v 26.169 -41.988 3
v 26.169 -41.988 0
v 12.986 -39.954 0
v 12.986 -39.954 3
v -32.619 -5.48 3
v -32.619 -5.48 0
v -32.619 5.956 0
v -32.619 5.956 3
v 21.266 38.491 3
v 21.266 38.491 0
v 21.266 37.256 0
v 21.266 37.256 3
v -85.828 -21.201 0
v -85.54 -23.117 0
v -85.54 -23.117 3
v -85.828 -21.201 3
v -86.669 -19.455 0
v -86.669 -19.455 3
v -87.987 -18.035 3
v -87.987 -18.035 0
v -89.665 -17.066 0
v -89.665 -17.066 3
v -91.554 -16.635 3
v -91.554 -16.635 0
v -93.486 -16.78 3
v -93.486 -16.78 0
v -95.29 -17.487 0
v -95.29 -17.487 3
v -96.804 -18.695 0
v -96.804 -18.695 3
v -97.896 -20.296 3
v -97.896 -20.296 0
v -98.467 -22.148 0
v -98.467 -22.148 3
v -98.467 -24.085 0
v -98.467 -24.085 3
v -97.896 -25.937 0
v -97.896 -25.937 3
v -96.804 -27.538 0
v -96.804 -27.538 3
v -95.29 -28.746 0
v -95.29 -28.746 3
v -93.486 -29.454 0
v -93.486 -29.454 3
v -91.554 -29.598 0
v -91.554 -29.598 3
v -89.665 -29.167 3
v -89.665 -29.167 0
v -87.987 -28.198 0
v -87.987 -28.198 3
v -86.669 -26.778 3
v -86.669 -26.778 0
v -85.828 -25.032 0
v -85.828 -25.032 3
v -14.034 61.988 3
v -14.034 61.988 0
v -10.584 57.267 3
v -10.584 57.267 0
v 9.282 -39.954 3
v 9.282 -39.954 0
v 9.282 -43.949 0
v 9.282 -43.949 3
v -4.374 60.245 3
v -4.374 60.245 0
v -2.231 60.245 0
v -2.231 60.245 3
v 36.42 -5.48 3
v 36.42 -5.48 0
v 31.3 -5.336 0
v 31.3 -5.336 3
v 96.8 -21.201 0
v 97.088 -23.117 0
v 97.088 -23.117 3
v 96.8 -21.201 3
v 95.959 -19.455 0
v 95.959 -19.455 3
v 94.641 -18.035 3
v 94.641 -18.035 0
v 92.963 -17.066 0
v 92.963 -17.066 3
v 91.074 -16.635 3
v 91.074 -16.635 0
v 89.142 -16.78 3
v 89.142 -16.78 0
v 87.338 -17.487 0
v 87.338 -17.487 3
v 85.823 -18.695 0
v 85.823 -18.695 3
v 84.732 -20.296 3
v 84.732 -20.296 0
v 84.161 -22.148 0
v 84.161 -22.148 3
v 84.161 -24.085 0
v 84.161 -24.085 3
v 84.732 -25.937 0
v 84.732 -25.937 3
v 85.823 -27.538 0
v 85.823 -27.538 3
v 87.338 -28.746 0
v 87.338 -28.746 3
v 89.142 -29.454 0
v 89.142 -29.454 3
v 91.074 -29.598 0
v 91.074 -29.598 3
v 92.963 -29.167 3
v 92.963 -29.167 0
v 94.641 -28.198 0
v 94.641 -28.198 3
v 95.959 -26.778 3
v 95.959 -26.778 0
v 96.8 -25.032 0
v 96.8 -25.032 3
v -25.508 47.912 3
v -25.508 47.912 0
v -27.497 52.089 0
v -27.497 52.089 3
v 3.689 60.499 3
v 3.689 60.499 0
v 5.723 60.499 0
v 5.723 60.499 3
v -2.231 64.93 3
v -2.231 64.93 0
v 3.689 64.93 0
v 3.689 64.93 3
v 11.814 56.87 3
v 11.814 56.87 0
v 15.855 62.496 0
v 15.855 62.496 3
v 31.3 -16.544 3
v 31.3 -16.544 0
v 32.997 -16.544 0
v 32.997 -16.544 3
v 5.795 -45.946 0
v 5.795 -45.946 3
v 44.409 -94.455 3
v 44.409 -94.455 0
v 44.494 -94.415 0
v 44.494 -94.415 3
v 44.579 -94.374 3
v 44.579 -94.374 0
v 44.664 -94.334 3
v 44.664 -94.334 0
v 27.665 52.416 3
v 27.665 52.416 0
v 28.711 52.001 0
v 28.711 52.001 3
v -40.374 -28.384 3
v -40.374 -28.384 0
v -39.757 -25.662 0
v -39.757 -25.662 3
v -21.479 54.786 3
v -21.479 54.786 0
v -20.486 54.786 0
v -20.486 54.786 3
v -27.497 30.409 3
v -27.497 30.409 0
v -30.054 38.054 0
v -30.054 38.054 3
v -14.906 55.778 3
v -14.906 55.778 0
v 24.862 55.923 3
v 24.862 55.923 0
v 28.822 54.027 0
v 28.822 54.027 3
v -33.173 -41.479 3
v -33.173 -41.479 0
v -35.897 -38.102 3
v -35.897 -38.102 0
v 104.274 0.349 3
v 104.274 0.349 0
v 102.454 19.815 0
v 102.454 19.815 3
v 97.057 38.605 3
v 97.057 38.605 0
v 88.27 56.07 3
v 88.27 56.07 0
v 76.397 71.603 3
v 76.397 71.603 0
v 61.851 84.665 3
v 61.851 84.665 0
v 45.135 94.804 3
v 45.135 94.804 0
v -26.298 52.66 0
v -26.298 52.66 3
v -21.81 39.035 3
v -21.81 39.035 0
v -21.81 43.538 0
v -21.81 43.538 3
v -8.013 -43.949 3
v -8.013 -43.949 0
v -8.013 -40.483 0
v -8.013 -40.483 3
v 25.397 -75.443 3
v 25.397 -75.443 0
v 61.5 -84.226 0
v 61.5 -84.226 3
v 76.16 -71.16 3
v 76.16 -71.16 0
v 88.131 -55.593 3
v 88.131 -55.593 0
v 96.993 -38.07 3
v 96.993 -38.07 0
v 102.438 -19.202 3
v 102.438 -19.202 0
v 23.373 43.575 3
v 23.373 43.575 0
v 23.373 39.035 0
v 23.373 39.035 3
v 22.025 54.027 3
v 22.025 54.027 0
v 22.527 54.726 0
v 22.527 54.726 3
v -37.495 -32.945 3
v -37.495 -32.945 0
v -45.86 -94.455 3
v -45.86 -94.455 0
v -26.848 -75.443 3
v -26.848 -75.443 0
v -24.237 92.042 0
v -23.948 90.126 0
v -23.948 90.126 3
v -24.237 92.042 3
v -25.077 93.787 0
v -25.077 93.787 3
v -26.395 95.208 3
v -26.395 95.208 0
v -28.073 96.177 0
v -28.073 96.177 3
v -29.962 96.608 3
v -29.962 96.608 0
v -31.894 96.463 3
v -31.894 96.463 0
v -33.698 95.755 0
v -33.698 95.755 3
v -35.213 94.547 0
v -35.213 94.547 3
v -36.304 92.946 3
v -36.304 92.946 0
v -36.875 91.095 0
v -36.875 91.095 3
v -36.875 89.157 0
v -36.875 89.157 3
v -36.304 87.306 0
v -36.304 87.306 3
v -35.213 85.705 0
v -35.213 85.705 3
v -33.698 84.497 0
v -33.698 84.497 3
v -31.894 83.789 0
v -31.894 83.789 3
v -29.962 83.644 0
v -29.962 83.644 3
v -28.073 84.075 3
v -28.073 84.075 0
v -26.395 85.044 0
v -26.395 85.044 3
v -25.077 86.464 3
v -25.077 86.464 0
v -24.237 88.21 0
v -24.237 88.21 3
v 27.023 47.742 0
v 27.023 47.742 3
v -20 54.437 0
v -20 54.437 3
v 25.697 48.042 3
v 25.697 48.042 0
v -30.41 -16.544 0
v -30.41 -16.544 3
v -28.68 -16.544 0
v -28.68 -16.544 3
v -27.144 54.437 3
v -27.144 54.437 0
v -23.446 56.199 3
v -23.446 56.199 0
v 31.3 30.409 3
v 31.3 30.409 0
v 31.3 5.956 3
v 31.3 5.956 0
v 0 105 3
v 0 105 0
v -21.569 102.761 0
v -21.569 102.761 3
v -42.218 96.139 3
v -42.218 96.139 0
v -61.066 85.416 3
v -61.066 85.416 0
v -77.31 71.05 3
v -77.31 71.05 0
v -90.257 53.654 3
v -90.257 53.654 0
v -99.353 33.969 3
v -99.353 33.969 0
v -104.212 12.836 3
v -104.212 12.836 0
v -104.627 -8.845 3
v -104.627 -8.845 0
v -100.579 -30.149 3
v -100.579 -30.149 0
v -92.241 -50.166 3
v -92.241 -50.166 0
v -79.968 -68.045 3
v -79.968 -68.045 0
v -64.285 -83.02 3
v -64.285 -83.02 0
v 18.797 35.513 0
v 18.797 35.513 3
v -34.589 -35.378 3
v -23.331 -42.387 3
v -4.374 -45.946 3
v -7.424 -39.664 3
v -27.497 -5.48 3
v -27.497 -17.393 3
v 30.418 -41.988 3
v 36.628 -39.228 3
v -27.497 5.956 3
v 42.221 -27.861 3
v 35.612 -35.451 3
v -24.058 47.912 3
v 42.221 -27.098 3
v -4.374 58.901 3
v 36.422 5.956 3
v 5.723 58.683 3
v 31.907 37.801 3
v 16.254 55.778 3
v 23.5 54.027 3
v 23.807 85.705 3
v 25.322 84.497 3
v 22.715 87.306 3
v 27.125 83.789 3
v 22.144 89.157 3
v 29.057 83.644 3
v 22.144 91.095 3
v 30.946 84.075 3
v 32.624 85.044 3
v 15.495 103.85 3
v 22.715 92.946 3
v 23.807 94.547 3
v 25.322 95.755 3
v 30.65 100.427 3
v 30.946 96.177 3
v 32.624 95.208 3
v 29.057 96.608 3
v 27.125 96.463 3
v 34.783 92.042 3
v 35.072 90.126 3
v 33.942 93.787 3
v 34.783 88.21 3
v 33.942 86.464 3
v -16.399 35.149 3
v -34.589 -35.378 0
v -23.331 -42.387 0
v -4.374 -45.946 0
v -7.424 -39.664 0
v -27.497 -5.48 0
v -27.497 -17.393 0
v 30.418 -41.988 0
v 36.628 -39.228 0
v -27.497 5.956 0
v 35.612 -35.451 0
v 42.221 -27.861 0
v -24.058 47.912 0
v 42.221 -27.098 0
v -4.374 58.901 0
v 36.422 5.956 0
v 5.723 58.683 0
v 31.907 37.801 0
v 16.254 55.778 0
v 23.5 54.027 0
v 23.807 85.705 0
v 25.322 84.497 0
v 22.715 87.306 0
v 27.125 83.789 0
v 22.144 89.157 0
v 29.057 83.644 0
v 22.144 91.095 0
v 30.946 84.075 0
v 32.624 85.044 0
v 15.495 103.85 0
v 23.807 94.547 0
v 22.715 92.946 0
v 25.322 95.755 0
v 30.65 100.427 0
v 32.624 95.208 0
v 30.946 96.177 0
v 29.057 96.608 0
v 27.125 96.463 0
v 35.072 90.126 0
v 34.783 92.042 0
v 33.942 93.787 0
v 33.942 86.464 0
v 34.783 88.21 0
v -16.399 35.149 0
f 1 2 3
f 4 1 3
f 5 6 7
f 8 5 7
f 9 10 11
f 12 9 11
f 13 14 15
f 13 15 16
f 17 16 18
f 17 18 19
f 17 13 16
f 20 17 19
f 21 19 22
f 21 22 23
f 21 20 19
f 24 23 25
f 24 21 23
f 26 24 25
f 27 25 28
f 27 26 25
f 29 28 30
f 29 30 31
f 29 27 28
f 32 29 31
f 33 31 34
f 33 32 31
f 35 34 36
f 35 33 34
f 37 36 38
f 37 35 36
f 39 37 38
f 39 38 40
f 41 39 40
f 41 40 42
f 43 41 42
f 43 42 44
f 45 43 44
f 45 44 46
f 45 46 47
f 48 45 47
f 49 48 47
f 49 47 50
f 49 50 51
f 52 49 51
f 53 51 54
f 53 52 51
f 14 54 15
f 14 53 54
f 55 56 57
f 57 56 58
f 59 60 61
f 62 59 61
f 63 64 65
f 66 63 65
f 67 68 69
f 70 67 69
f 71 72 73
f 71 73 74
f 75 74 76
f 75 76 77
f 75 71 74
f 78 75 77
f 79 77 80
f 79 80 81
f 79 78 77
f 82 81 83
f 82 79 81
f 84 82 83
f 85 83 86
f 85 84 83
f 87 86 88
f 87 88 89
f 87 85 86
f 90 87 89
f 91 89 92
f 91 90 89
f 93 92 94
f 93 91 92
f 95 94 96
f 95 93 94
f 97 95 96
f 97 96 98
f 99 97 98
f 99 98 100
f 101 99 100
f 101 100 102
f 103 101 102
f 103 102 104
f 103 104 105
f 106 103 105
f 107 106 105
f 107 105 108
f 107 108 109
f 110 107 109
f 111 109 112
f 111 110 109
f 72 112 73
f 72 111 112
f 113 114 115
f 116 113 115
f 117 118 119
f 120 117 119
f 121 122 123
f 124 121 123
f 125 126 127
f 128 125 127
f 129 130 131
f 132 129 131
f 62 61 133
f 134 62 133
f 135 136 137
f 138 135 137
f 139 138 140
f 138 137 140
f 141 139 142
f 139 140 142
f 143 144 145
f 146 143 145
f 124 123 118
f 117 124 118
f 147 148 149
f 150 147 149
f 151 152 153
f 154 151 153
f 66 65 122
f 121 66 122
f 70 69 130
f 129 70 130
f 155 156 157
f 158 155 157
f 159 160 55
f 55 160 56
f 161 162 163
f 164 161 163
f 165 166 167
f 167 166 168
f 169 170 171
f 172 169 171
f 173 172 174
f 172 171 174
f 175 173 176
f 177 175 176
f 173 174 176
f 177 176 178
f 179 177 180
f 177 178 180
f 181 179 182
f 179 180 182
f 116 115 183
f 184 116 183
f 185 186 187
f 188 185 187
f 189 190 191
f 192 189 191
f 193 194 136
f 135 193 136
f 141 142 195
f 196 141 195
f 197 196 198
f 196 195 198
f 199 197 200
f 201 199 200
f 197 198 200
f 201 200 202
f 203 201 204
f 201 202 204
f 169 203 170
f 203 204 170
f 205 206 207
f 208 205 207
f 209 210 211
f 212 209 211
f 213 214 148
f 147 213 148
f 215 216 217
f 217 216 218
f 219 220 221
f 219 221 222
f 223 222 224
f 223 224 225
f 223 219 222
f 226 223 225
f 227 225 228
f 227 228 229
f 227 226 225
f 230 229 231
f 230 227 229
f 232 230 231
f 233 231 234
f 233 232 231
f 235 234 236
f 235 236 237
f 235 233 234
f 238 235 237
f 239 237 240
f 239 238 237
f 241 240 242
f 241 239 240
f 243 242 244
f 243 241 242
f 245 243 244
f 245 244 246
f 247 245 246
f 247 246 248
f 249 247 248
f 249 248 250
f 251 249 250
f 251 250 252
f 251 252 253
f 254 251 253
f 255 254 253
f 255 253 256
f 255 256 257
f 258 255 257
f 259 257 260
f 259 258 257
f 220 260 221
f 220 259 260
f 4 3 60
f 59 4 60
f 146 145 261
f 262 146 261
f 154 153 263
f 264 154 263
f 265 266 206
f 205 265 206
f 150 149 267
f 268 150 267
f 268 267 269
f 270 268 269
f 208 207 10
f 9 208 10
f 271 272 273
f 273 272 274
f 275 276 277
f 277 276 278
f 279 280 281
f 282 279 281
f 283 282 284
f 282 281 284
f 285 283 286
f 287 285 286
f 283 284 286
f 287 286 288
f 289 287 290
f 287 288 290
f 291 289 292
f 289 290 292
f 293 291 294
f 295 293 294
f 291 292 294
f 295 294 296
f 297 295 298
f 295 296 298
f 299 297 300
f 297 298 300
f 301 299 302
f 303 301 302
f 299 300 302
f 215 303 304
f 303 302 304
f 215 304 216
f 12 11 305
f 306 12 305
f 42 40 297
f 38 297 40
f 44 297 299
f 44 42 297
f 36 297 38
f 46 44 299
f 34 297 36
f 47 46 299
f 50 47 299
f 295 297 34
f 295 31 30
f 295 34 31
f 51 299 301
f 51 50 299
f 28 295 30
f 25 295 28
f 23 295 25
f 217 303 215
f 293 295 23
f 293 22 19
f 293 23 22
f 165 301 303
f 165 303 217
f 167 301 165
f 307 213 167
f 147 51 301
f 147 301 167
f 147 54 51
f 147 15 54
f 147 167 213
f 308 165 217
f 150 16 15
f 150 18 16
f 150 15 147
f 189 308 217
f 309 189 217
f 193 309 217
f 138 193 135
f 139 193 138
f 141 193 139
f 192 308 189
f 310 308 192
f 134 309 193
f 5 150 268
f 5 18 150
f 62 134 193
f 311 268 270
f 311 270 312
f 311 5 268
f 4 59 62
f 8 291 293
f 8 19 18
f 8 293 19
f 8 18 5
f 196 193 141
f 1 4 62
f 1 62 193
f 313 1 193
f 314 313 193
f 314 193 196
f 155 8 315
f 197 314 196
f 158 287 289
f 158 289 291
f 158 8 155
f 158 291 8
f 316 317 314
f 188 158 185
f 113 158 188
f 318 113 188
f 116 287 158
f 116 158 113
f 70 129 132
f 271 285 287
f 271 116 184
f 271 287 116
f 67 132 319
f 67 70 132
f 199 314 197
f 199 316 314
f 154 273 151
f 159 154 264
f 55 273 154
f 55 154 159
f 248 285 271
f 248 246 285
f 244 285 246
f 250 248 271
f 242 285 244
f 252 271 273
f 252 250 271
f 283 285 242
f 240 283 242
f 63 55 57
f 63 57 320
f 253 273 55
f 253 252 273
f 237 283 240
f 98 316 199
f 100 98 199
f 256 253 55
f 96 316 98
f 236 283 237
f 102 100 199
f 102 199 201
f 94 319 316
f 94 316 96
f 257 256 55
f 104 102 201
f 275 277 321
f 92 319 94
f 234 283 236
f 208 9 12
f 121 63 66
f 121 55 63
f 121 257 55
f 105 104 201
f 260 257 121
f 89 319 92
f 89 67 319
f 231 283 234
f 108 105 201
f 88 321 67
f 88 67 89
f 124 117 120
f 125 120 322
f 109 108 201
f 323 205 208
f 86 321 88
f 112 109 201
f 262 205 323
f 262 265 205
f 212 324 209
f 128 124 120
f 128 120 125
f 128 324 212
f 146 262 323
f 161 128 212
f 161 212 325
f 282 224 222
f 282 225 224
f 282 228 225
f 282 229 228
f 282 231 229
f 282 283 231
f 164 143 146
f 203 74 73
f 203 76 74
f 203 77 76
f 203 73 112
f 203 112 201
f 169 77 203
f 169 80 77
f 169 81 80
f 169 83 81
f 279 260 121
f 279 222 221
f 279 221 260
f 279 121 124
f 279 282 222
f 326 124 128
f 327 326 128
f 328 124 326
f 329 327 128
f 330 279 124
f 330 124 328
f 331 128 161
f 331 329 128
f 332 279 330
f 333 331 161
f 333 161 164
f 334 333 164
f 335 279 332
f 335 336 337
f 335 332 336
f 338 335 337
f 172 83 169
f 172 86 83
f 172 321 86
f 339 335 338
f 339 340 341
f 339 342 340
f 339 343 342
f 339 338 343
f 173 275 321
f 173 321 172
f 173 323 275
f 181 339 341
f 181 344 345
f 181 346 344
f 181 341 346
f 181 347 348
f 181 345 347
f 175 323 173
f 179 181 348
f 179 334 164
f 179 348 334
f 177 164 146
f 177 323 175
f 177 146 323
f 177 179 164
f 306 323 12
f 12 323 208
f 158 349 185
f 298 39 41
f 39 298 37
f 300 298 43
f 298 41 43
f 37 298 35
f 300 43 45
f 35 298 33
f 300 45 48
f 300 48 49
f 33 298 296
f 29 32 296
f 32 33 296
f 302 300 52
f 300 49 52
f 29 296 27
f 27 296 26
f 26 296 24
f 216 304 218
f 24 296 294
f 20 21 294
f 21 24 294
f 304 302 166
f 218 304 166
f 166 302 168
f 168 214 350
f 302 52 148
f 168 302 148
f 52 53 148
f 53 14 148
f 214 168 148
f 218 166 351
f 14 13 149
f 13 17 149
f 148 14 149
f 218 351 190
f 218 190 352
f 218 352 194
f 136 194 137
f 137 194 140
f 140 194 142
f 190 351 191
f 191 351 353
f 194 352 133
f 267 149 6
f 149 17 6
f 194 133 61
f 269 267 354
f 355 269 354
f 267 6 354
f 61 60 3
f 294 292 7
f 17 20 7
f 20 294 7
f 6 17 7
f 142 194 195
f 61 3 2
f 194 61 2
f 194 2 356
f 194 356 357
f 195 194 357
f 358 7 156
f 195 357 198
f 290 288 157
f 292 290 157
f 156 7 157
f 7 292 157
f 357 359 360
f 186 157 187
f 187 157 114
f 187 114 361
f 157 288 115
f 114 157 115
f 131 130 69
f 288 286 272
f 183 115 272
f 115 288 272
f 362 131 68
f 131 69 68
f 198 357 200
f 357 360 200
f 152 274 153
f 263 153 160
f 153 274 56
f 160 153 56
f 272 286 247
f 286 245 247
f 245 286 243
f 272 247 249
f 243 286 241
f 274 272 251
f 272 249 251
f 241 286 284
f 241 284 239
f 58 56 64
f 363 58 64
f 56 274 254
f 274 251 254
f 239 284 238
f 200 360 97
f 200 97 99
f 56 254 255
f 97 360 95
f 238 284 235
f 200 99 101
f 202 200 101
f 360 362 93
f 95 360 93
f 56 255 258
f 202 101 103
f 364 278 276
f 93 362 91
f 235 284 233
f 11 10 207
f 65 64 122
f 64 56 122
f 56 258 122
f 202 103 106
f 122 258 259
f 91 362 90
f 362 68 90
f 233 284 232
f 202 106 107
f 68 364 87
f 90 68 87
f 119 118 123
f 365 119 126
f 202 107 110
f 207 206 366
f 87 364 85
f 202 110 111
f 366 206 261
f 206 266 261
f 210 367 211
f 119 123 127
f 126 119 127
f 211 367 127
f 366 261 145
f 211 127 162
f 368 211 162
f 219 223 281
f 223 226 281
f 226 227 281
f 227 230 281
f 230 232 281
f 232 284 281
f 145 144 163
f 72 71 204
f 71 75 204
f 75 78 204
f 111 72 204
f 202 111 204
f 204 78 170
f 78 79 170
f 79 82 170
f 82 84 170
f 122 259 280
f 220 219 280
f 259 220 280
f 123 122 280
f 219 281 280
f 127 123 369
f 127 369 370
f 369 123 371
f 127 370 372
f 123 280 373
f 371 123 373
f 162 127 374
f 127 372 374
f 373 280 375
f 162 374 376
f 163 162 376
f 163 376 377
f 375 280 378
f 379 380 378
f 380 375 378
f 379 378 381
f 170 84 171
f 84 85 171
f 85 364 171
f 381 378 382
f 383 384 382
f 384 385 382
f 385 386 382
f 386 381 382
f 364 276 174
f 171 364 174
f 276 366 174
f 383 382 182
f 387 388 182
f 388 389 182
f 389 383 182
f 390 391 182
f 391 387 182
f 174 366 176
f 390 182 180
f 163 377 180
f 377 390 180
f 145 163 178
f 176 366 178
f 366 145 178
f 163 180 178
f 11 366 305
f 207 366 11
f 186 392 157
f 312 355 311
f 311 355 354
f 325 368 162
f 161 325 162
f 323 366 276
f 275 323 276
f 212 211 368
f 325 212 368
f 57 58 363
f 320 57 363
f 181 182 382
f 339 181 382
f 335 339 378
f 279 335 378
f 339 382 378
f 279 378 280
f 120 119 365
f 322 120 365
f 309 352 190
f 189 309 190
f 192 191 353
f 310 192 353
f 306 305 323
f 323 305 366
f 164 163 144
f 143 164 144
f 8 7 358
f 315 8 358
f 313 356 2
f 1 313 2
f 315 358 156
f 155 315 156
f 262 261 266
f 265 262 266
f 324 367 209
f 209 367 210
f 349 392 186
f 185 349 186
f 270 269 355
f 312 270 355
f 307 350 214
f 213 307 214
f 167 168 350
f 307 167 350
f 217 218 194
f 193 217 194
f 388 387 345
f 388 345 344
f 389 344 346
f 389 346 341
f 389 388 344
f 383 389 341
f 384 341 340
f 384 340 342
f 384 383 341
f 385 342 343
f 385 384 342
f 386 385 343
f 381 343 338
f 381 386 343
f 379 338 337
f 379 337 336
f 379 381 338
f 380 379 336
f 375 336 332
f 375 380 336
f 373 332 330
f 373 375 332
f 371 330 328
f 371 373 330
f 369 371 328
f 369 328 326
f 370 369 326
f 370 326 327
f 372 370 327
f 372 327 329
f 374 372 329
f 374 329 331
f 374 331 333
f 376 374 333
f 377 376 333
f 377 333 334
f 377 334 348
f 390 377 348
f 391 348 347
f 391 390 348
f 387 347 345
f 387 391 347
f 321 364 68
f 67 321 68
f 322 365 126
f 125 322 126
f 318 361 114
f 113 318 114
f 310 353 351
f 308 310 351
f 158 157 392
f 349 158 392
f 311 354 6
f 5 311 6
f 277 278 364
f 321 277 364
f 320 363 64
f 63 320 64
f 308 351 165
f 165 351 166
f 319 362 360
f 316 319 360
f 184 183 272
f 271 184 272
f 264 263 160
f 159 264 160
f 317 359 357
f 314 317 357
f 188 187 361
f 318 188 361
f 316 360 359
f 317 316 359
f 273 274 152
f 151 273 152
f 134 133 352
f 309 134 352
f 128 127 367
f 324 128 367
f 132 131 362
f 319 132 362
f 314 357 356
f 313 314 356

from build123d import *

# Parameters (mm, degrees)
F0_R     = 6.5
F1_DEPTH = 3


with BuildPart() as f1:
    # F0 (on Top) → F1 (new body)
    with BuildSketch(Plane.XY):
        with BuildLine():
            Line((0, 64.92969), (0, 105))
            ThreePointArc((0, 105), (-102.329905, 23.528505), (-45.860375, -94.455418))
            Line((-45.860375, -94.455418), (-26.848407, -75.44345))
            Line((-26.848407, -75.44345), (0, -75.44345))
            Line((0, -75.44345), (0, -45.946423))
            Line((0, -45.946423), (-4.373633, -45.946423))
            Line((-4.373633, -45.946423), (-8.012874, -43.948987))
            Line((-8.012874, -43.948987), (-8.012874, -40.483214))
            Line((-8.012874, -40.483214), (-7.424269, -39.663567))
            Line((-7.424269, -39.663567), (-23.331161, -42.38735))
            Line((-23.331161, -42.38735), (-33.173094, -41.479423))
            Line((-33.173094, -41.479423), (-35.896877, -38.101933))
            Line((-35.896877, -38.101933), (-34.589463, -35.37815))
            Line((-34.589463, -35.37815), (-37.494832, -32.944905))
            Line((-37.494832, -32.944905), (-40.373584, -28.384436))
            Line((-40.373584, -28.384436), (-39.757261, -25.662348))
            Line((-39.757261, -25.662348), (-30.409717, -16.543746))
            Line((-30.409717, -16.543746), (-28.680348, -16.543746))
            Line((-28.680348, -16.543746), (-27.497232, -17.393365))
            Line((-27.497232, -17.393365), (-27.497232, -5.479778))
            Line((-27.497232, -5.479778), (-32.618854, -5.479778))
            Line((-32.618854, -5.479778), (-32.618854, 5.955574))
            Line((-32.618854, 5.955574), (-27.497232, 5.955574))
            Line((-27.497232, 5.955574), (-27.497232, 30.408693))
            Line((-27.497232, 30.408693), (-30.054469, 38.053981))
            Line((-30.054469, 38.053981), (-16.39924, 35.148612))
            Line((-16.39924, 35.148612), (-21.810488, 39.03454))
            Line((-21.810488, 39.03454), (-21.810488, 43.537862))
            Line((-21.810488, 43.537862), (-24.057509, 47.911971))
            Line((-24.057509, 47.911971), (-25.507802, 47.911971))
            Line((-25.507802, 47.911971), (-27.497232, 52.08861))
            Line((-27.497232, 52.08861), (-26.29794, 52.65986))
            Line((-26.29794, 52.65986), (-27.144464, 54.437064))
            Line((-27.144464, 54.437064), (-23.446245, 56.198612))
            Line((-23.446245, 56.198612), (-21.478997, 54.78589))
            Line((-21.478997, 54.78589), (-20.486095, 54.78589))
            Line((-20.486095, 54.78589), (-20.000346, 54.437064))
            Line((-20.000346, 54.437064), (-14.9056, 55.777782))
            Line((-14.9056, 55.777782), (-14.033989, 61.988003))
            Line((-14.033989, 61.988003), (-10.583865, 57.266784))
            Line((-10.583865, 57.266784), (-4.373633, 58.90105))
            Line((-4.373633, 58.90105), (-4.373633, 60.244786))
            Line((-4.373633, 60.244786), (-2.230932, 60.244786))
            Line((-2.230932, 60.244786), (-2.230932, 64.92969))
            Line((-2.230932, 64.92969), (0, 64.92969))
        make_face()
        with Locations((-92.039506, -23.116552)):
            Circle(F0_R, mode=Mode.SUBTRACT)
        with Locations((-30.448022, 90.125876)):
            Circle(F0_R, mode=Mode.SUBTRACT)
        with BuildLine():
            ThreePointArc((45.134783, 94.804279), (23.136018, 102.419357), (0, 105))
            Line((0, 105), (0, 64.92969))
            Line((0, 64.92969), (3.688756, 64.92969))
            Line((3.688756, 64.92969), (3.688756, 60.499008))
            Line((3.688756, 60.499008), (5.722514, 60.499008))
            Line((5.722514, 60.499008), (5.722514, 58.683149))
            Line((5.722514, 58.683149), (11.814197, 56.869553))
            Line((11.814197, 56.869553), (15.854987, 62.496448))
            Line((15.854987, 62.496448), (16.254476, 55.777782))
            Line((16.254476, 55.777782), (22.025488, 54.02744))
            Line((22.025488, 54.02744), (22.527293, 54.726216))
            Line((22.527293, 54.726216), (23.500354, 54.02744))
            Line((23.500354, 54.02744), (24.861629, 55.923048))
            Line((24.861629, 55.923048), (28.822297, 54.02744))
            Line((28.822297, 54.02744), (27.664759, 52.415541))
            Line((27.664759, 52.415541), (28.711242, 52.000801))
            Line((28.711242, 52.000801), (27.023366, 47.741913))
            Line((27.023366, 47.741913), (25.696923, 48.04224))
            Line((25.696923, 48.04224), (23.37263, 43.575236))
            Line((23.37263, 43.575236), (23.37263, 39.03454))
            Line((23.37263, 39.03454), (21.266238, 38.49084))
            Line((21.266238, 38.49084), (21.266238, 37.256059))
            Line((21.266238, 37.256059), (18.796676, 35.512838))
            Line((18.796676, 35.512838), (31.907149, 37.800815))
            Line((31.907149, 37.800815), (31.300232, 30.408693))
            Line((31.300232, 30.408693), (31.300232, 5.955574))
            Line((31.300232, 5.955574), (36.421863, 5.955574))
            Line((36.421863, 5.955574), (36.419832, -5.479778))
            Line((36.419832, -5.479778), (31.300232, -5.33569))
            Line((31.300232, -5.33569), (31.300232, -15.820357))
            Line((31.300232, -15.820357), (31.300232, -16.543746))
            Line((31.300232, -16.543746), (32.996665, -16.543746))
            Line((32.996665, -16.543746), (42.221212, -27.097848))
            Line((42.221212, -27.097848), (42.221212, -27.860507))
            Line((42.221212, -27.860507), (35.611501, -35.45078))
            Line((35.611501, -35.45078), (36.628378, -39.227758))
            Line((36.628378, -39.227758), (30.418154, -41.987859))
            Line((30.418154, -41.987859), (26.169052, -41.987859))
            Line((26.169052, -41.987859), (12.985943, -39.954101))
            Line((12.985943, -39.954101), (9.281599, -39.954101))
            Line((9.281599, -39.954101), (9.281599, -43.948987))
            Line((9.281599, -43.948987), (5.795156, -45.946423))
            Line((5.795156, -45.946423), (0, -45.946423))
            Line((0, -45.946423), (0, -75.44345))
            Line((0, -75.44345), (25.397223, -75.44345))
            Line((25.397223, -75.44345), (44.40919, -94.455418))
            ThreePointArc((44.40919, -94.455418), (44.5367, -94.394607), (44.664128, -94.333625))
            ThreePointArc((44.664128, -94.333625), (88.130811, -55.593427), (104.274408, 0.348861))
            ThreePointArc((104.274408, 0.348861), (88.269743, 56.069866), (45.134783, 94.804279))
        make_face()
        with Locations((90.588322, -23.116552)):
            Circle(F0_R, mode=Mode.SUBTRACT)
        with Locations((28.571626, 90.125876)):
            Circle(F0_R, mode=Mode.SUBTRACT)
    extrude(amount=F1_DEPTH)


solid = f1.part
